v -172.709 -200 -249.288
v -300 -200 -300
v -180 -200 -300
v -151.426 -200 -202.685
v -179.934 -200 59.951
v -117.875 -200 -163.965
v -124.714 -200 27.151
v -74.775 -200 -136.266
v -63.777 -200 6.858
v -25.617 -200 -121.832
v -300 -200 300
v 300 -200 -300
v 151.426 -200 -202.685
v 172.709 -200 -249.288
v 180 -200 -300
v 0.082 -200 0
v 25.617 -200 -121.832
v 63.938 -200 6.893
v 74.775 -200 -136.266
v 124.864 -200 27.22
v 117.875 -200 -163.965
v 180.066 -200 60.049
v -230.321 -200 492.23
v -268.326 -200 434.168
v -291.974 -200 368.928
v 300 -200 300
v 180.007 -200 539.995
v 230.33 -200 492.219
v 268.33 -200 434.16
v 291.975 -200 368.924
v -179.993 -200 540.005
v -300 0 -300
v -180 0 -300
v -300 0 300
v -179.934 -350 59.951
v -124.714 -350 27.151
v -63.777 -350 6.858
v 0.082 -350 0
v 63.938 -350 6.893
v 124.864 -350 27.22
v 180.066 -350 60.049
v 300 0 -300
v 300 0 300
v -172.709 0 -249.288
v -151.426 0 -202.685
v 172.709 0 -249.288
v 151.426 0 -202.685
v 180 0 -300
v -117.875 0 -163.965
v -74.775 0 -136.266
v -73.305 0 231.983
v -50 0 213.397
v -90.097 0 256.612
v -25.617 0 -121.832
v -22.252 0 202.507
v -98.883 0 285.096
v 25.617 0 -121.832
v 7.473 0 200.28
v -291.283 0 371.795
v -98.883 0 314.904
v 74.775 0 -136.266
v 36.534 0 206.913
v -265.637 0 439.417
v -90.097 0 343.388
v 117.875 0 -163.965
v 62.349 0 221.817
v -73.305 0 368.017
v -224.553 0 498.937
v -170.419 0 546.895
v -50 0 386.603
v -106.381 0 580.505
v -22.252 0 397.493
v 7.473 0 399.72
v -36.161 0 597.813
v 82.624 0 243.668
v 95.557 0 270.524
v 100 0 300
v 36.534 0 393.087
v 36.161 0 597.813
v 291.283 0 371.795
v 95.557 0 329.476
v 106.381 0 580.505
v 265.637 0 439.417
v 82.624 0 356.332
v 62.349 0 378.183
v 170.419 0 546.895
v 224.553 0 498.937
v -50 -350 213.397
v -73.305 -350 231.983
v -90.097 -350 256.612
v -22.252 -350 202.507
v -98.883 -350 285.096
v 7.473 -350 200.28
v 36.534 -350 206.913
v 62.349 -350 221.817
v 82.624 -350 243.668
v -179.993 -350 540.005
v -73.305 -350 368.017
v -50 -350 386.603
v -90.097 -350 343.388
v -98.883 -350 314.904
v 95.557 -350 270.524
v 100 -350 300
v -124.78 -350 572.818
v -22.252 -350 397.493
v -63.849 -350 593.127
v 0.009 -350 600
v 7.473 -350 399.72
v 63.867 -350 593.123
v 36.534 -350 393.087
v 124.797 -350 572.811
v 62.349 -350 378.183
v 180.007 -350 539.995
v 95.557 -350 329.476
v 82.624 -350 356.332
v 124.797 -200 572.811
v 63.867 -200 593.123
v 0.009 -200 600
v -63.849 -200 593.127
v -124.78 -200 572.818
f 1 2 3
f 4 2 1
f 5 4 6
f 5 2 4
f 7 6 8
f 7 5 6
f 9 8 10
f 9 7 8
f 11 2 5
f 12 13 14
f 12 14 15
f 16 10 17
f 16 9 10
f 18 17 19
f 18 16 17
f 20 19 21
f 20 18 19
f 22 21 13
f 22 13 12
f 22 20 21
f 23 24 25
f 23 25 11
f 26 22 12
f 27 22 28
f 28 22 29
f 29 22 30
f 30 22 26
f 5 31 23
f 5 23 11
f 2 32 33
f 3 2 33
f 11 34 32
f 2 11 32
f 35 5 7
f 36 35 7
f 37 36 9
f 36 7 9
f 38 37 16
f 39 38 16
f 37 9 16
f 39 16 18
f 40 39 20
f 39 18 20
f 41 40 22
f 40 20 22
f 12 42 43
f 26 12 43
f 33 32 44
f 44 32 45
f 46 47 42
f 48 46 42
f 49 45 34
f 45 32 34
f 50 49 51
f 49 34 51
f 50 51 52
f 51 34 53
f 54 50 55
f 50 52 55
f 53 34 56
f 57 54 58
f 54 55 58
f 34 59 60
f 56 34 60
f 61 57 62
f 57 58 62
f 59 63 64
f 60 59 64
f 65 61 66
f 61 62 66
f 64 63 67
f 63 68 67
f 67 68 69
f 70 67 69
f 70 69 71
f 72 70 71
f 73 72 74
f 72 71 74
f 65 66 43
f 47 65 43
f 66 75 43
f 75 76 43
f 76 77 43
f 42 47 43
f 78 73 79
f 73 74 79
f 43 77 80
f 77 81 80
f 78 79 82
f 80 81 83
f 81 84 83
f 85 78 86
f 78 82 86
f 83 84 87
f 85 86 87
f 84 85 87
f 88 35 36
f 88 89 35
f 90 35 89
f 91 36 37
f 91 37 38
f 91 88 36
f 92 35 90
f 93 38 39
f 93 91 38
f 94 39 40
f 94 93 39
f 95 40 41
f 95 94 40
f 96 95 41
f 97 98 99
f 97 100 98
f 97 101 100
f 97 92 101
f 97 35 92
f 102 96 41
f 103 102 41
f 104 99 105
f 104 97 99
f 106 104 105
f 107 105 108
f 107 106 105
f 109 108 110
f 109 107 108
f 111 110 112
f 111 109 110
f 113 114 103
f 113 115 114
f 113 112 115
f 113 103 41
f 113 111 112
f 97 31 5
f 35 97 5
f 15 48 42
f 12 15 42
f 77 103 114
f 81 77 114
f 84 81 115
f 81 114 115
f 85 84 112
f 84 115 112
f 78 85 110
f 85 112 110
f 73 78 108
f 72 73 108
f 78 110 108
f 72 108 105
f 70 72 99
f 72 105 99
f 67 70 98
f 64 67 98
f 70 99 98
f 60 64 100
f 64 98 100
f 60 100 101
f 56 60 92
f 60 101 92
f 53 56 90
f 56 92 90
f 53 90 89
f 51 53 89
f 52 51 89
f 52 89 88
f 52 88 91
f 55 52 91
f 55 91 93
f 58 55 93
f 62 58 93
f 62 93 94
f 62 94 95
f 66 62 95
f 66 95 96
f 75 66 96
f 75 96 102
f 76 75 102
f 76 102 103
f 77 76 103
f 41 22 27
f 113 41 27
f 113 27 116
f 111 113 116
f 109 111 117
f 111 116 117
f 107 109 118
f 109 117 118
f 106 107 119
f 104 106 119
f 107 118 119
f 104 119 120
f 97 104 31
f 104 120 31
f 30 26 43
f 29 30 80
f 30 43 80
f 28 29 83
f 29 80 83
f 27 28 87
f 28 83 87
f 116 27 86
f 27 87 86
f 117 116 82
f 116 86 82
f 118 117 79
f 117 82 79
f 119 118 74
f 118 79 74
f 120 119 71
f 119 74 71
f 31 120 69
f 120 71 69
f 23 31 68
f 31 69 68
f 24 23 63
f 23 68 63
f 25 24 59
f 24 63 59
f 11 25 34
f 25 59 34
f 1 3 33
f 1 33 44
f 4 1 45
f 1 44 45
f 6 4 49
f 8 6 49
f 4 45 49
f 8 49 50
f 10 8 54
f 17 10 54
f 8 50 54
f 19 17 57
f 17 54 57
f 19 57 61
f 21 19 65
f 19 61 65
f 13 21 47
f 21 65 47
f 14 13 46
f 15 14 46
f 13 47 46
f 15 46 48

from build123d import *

# Parameters (mm, degrees)
F1_DEPTH = 200
F3_DEPTH = 150
F4_R     = 100
F5_DEPTH = 350.001


with BuildPart() as f1:
    # F0 (on Front) → F1 (new body)
    with BuildSketch(Plane.XZ):
        with BuildLine():
            Line((-300, 300), (-300, -300))
            Line((-300, -300), (-180, -300))
            ThreePointArc((-180, -300), (0, -120), (180, -300))
            Line((180, -300), (300, -300))
            Line((300, -300), (300, 300))
            ThreePointArc((300, 300), (0, 600), (-300, 300))
        make_face()
    extrude(amount=F1_DEPTH)

    # F2 (on face) → F3 (join)
    with BuildSketch(Plane.XZ.offset(200)):
        with BuildLine():
            Line((-179.99268, 540.00549), (-179.934111, 59.950597))
            ThreePointArc((-179.934111, 59.950597), (0.082353, 1.1e-05), (180.065876, 60.049421))
            Line((180.065876, 60.049421), (180.00732, 539.99451))
            ThreePointArc((180.00732, 539.99451), (0.00915, 600), (-179.99268, 540.00549))
        make_face()
    extrude(amount=F3_DEPTH)

    # F4 (on face) → F5 (cut, through all)
    with BuildSketch(Plane.XZ.offset(350)):
        with Locations((0, 300)):
            Circle(F4_R)
    extrude(amount=-F5_DEPTH, mode=Mode.SUBTRACT)


solid = f1.part
